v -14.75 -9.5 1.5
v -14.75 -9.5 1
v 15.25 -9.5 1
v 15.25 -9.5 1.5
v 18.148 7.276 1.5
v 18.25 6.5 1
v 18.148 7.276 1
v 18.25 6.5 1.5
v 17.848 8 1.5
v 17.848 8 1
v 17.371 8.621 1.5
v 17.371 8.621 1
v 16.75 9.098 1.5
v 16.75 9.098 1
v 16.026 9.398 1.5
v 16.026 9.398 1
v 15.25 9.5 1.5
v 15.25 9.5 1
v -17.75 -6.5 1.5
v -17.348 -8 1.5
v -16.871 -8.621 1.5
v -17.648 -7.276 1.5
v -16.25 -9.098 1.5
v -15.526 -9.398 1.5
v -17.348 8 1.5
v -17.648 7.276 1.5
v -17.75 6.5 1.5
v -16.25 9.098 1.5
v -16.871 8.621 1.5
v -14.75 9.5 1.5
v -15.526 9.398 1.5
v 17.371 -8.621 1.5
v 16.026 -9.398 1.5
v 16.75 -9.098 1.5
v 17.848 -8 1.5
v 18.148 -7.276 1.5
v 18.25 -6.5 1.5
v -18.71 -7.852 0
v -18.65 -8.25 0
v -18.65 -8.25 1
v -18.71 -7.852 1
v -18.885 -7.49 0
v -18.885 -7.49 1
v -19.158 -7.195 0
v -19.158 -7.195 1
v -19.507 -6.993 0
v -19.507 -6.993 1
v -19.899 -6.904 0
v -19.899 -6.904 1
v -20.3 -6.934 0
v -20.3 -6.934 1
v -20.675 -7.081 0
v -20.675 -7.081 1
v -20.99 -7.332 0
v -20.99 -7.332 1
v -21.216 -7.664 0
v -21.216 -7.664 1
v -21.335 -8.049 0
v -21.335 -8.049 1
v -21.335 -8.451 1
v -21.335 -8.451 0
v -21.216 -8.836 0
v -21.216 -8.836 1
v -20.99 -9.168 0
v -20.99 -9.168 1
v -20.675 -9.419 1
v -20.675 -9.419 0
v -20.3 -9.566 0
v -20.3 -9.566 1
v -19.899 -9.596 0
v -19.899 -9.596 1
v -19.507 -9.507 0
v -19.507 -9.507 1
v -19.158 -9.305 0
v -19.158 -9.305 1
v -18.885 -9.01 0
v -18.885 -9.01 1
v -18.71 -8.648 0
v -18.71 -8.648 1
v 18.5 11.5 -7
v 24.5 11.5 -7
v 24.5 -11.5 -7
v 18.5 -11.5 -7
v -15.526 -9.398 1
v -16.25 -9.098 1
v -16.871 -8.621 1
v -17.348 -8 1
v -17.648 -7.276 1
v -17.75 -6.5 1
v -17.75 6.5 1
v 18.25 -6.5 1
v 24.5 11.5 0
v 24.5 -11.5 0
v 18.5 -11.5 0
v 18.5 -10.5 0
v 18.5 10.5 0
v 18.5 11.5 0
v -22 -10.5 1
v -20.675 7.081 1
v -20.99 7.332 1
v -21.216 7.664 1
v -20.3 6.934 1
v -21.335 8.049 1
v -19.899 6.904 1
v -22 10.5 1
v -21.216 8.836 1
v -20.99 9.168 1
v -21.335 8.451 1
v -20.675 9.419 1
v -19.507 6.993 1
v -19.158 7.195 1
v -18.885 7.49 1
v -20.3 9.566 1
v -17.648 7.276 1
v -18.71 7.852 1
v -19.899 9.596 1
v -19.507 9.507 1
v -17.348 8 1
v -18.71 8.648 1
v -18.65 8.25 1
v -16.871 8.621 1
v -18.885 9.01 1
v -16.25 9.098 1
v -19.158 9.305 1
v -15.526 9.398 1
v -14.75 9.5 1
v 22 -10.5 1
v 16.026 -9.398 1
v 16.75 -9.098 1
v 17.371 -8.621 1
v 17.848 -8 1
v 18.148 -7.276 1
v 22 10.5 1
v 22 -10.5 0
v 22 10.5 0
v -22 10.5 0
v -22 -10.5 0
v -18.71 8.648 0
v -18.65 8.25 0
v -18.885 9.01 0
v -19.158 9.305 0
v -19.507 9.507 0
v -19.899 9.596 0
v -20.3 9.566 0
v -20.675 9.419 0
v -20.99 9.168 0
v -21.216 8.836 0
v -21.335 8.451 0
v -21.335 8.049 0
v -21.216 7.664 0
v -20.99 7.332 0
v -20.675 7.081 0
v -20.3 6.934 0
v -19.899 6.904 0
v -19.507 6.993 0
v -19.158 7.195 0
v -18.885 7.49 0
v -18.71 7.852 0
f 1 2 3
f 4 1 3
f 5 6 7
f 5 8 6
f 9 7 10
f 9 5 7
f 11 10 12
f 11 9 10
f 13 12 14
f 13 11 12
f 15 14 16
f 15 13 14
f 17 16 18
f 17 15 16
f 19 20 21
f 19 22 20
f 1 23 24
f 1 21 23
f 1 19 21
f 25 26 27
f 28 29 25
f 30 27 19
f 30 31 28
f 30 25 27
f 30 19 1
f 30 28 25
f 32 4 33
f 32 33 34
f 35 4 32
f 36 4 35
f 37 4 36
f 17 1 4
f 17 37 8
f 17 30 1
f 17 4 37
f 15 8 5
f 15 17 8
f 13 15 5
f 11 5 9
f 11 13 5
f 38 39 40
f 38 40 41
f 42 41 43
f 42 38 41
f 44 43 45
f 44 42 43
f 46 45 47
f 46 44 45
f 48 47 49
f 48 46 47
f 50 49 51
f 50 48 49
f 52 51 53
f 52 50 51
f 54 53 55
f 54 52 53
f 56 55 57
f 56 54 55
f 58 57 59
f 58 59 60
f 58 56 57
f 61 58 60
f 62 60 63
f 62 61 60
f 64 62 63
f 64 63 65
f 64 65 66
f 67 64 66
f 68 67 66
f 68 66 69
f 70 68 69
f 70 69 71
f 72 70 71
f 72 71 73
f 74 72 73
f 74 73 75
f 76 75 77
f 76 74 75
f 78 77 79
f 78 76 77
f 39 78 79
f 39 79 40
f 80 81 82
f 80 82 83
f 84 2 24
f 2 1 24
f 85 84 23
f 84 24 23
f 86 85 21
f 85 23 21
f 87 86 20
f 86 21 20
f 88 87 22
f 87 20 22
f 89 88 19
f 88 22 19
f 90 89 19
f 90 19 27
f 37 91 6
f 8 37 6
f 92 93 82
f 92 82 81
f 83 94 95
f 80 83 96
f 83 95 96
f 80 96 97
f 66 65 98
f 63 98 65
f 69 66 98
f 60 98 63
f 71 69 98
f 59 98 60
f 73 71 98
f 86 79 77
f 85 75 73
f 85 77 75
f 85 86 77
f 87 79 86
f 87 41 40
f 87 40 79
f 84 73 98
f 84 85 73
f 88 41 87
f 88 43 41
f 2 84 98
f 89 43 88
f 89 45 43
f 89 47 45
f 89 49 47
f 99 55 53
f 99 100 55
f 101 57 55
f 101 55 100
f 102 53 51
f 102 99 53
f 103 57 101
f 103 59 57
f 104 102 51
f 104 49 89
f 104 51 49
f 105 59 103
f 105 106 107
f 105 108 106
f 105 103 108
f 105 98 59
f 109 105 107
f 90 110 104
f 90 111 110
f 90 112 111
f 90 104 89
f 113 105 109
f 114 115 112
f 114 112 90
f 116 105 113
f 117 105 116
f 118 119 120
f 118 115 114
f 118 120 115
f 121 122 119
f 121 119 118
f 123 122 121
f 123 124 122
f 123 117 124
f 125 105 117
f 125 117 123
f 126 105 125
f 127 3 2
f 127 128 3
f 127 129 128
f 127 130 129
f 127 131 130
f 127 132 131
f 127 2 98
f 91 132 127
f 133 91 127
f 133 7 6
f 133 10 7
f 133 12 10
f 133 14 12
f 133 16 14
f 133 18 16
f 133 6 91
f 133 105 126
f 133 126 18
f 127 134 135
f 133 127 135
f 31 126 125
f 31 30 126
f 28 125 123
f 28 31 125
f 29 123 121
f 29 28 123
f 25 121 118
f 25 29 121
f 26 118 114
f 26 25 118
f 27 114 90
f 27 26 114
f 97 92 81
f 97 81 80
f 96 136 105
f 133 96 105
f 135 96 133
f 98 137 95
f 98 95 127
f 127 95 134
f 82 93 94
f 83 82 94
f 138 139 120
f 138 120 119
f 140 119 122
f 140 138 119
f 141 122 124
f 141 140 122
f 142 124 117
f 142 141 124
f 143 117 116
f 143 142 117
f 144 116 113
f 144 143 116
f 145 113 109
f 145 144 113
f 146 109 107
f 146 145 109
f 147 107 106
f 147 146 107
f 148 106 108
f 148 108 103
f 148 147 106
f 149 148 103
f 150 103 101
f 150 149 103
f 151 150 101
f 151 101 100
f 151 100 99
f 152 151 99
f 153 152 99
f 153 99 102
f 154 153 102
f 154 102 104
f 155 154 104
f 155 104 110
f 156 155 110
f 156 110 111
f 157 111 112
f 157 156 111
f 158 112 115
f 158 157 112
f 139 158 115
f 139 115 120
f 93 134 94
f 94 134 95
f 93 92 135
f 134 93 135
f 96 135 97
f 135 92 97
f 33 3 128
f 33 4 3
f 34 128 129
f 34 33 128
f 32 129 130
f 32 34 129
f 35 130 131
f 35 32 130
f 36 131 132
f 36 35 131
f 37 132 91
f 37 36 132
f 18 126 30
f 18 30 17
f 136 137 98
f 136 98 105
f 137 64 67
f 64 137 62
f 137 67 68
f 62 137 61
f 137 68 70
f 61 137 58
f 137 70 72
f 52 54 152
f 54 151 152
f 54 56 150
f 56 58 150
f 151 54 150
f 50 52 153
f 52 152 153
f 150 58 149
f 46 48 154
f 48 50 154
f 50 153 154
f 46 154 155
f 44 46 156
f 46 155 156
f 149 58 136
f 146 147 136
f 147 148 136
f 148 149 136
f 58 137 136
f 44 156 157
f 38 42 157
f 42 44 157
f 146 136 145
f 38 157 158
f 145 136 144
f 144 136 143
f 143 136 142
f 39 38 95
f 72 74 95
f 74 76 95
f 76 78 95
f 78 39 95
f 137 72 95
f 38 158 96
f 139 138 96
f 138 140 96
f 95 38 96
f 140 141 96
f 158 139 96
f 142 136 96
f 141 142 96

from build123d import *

# Parameters (mm, degrees)
SKETCH1_W           = 44
SKETCH1_H           = 21
SKETCH1_R           = 1.35
BOSS_EXTRUDE1_DEPTH = 1
SKETCH2_W           = 36
SKETCH2_H           = 19
BOSS_EXTRUDE2_DEPTH = 0.5
FILLET1_R           = 3
SKETCH3_W           = 6
SKETCH3_H           = 23
BOSS_EXTRUDE3_DEPTH = 7


with BuildPart() as part:
    # Sketch1 → Boss-Extrude1 (new body)
    with BuildSketch(Plane.XY):
        Rectangle(SKETCH1_W, SKETCH1_H)
        with Locations((-20, 8.25)):
            Circle(SKETCH1_R, mode=Mode.SUBTRACT)
        with Locations((-20, -8.25)):
            Circle(SKETCH1_R, mode=Mode.SUBTRACT)
    extrude(amount=BOSS_EXTRUDE1_DEPTH)

    # Sketch2 → Boss-Extrude2 (add)
    with BuildSketch(Plane.XY.offset(1)):
        with Locations((0.25, 0)):
            Rectangle(SKETCH2_W, SKETCH2_H)
    extrude(amount=BOSS_EXTRUDE2_DEPTH)

    # Fillet1
    fillet1_edges = [part.edges().sort_by_distance(p)[0] for p in [
        (18.25, 9.5, 1.25),
        (-17.75, 9.5, 1.25),
        (-17.75, -9.5, 1.25),
        (18.25, -9.5, 1.25),
    ]]
    fillet(fillet1_edges, radius=FILLET1_R)

    # Sketch3 → Boss-Extrude3 (add)
    with BuildSketch(Plane(origin=(0, 0, 0), x_dir=(-1, 0, 0), z_dir=(0, 0, -1))):
        with Locations((-21.5, 0)):
            Rectangle(SKETCH3_W, SKETCH3_H)
    extrude(amount=BOSS_EXTRUDE3_DEPTH)


solid = part.part
